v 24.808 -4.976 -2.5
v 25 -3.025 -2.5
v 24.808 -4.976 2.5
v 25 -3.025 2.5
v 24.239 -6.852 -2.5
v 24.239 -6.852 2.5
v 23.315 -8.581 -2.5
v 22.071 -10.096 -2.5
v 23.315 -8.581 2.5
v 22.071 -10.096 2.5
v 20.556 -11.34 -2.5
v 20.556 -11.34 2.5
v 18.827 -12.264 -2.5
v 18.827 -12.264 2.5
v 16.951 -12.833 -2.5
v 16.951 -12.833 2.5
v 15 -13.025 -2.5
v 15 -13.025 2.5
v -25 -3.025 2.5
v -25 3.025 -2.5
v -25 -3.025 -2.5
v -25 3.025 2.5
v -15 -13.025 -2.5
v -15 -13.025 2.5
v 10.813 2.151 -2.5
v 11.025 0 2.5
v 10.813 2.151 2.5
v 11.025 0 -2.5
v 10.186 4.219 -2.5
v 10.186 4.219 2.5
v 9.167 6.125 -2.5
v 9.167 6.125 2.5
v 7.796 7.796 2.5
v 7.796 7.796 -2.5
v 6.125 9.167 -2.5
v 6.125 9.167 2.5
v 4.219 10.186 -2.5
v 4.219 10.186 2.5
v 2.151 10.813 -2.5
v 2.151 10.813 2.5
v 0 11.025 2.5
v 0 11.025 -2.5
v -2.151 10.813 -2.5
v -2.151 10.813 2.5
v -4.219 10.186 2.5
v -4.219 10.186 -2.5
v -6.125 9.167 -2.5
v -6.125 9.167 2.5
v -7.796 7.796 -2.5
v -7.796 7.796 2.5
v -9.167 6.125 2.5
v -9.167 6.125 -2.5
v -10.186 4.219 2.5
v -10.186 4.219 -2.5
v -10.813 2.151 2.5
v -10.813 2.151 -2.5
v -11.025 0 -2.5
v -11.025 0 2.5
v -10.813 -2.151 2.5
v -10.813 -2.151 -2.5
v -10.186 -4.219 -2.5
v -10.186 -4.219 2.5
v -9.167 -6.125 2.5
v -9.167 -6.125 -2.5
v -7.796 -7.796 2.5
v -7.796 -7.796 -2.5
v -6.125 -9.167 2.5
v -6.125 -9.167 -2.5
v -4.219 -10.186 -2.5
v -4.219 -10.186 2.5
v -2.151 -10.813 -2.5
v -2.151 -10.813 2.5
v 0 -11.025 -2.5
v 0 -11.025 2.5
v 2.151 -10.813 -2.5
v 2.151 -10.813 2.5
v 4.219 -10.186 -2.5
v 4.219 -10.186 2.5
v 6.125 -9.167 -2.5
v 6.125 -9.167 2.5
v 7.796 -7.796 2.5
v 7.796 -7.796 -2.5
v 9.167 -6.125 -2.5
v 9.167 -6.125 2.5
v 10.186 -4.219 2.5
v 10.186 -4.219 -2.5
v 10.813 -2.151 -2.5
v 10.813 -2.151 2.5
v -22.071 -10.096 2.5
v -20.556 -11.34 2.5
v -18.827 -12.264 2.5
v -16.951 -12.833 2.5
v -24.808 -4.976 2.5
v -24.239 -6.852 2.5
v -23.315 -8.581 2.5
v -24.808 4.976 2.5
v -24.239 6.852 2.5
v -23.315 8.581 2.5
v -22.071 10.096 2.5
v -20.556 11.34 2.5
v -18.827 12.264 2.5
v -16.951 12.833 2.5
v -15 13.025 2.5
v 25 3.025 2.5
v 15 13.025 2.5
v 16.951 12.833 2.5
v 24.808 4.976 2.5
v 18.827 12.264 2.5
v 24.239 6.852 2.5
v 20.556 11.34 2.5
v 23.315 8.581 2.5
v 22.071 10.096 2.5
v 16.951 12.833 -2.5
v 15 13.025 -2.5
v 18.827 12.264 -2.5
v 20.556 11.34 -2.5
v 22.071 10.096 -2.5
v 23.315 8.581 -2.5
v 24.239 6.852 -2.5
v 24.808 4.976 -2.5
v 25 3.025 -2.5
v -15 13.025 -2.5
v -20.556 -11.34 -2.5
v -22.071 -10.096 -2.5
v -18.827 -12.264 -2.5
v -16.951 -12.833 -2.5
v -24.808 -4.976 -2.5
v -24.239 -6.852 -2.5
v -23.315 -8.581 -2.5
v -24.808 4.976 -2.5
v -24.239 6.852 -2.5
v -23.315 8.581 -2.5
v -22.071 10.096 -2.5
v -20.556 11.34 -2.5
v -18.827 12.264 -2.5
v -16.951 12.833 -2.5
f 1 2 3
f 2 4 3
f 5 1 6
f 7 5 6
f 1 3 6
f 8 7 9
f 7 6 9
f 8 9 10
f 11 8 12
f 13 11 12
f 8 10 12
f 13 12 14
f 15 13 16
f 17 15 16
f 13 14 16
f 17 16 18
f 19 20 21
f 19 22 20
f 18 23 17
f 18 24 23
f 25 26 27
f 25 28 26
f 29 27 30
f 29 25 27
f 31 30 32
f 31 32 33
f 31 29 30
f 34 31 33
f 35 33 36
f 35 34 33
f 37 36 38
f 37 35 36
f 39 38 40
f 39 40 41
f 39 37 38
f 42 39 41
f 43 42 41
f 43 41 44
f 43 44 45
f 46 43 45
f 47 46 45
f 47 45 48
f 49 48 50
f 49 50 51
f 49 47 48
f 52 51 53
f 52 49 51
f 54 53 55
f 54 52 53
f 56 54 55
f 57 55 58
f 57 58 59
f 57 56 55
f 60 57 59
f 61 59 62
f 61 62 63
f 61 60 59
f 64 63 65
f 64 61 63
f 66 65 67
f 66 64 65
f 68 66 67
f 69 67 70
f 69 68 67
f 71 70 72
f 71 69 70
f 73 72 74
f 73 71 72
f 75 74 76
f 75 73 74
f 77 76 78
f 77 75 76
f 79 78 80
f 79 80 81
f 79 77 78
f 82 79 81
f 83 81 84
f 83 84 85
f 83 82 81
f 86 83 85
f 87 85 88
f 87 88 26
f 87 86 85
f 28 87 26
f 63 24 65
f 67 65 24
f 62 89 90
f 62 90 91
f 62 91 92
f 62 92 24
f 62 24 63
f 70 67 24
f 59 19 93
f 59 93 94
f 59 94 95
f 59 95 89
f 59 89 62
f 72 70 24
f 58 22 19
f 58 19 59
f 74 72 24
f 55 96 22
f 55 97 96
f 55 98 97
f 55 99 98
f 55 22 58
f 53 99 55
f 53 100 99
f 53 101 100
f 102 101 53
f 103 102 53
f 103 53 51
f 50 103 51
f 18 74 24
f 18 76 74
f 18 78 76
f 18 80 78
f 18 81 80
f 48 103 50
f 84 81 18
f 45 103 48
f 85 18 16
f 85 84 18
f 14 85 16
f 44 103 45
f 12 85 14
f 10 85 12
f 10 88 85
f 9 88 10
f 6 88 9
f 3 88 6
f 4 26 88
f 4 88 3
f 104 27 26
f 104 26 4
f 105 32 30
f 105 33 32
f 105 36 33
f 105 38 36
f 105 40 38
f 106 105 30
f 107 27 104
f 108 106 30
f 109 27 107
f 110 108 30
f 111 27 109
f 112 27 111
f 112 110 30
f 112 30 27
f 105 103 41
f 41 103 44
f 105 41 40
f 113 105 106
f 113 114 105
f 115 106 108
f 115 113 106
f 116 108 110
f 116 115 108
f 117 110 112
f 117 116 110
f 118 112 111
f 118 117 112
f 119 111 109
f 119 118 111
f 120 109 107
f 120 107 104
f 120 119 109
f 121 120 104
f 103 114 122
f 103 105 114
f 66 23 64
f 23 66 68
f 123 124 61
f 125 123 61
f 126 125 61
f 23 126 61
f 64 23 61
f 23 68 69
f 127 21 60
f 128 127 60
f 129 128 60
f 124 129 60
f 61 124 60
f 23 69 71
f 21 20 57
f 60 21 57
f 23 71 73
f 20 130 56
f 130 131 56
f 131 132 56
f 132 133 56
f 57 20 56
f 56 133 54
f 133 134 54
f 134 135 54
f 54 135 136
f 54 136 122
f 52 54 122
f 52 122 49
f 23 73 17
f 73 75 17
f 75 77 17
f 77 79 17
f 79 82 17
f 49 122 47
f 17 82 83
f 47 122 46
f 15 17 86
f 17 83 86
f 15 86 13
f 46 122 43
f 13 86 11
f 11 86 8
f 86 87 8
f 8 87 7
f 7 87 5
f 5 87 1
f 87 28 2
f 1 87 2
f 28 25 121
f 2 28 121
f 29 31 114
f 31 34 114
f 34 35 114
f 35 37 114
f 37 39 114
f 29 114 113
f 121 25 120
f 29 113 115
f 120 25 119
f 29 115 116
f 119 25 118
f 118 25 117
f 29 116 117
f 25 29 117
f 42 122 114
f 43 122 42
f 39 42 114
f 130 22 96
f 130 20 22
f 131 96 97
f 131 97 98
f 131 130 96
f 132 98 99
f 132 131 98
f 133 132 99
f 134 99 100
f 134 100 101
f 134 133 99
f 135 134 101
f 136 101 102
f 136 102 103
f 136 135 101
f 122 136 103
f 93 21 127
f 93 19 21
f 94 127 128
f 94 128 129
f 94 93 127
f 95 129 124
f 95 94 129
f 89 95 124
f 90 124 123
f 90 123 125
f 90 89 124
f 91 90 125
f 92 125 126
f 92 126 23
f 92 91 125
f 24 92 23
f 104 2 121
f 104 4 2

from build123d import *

# Parameters (mm, degrees)
F0_R     = 11.025
F1_DEPTH = 2.5
F4_R     = 10


with BuildPart() as f1:
    # F0 (on Top) → F1 (new body, symmetric)
    with BuildSketch(Plane.XY):
        with BuildLine():
            ThreePointArc((0, -13.025), (-13.025, 0), (0, 13.025))
            Line((0, 13.025), (-25, 13.025))
            Line((-25, 13.025), (-25, -13.025))
            Line((-25, -13.025), (0, -13.025))
        make_face()
        with BuildLine():
            ThreePointArc((0, 13.025), (9.210066, 9.210066), (13.025, 0))
            ThreePointArc((13.025, 0), (9.210066, -9.210066), (0, -13.025))
            Line((0, -13.025), (25, -13.025))
            Line((25, -13.025), (25, 13.025))
            Line((25, 13.025), (0, 13.025))
        make_face()
        with BuildLine():
            ThreePointArc((0, -13.025), (9.210066, -9.210066), (13.025, 0))
            ThreePointArc((13.025, 0), (9.210066, 9.210066), (0, 13.025))
            ThreePointArc((0, 13.025), (-13.025, 0), (0, -13.025))
        make_face()
        Circle(F0_R, mode=Mode.SUBTRACT)
    extrude(amount=F1_DEPTH, both=True)

    # F2 (on Right) → F3 (revolve, cut)
    with BuildSketch(Plane.YZ):
        with BuildLine():
            Line((6.4, 2.5), (5.430738, 2.5))
            Line((5.430738, 2.5), (5.430738, -2.5))
            Line((5.430738, -2.5), (6.4, -2.5))
            add(Edge.make_bspline(
                [(6.4, 2.5), (6.199995, 1.666646), (6.3, -2.1e-05), (6.200005, -1.666687), (6.4, -2.5)],
                knots=[0, 0, 0, 0, 2.504557, 5.008992, 5.008992, 5.008992, 5.008992], degree=3))
        make_face()
    revolve(axis=Axis((0, 0, 5.107941), (0, 0, 1)), mode=Mode.SUBTRACT)

    # F4
    f4_edges = [f1.edges().sort_by_distance(p)[0] for p in [
        (-25, -13.025, 0),
        (-25, 13.025, 0),
        (25, -13.025, 0),
        (25, 13.025, 0),
    ]]
    fillet(f4_edges, radius=F4_R)


solid = f1.part
